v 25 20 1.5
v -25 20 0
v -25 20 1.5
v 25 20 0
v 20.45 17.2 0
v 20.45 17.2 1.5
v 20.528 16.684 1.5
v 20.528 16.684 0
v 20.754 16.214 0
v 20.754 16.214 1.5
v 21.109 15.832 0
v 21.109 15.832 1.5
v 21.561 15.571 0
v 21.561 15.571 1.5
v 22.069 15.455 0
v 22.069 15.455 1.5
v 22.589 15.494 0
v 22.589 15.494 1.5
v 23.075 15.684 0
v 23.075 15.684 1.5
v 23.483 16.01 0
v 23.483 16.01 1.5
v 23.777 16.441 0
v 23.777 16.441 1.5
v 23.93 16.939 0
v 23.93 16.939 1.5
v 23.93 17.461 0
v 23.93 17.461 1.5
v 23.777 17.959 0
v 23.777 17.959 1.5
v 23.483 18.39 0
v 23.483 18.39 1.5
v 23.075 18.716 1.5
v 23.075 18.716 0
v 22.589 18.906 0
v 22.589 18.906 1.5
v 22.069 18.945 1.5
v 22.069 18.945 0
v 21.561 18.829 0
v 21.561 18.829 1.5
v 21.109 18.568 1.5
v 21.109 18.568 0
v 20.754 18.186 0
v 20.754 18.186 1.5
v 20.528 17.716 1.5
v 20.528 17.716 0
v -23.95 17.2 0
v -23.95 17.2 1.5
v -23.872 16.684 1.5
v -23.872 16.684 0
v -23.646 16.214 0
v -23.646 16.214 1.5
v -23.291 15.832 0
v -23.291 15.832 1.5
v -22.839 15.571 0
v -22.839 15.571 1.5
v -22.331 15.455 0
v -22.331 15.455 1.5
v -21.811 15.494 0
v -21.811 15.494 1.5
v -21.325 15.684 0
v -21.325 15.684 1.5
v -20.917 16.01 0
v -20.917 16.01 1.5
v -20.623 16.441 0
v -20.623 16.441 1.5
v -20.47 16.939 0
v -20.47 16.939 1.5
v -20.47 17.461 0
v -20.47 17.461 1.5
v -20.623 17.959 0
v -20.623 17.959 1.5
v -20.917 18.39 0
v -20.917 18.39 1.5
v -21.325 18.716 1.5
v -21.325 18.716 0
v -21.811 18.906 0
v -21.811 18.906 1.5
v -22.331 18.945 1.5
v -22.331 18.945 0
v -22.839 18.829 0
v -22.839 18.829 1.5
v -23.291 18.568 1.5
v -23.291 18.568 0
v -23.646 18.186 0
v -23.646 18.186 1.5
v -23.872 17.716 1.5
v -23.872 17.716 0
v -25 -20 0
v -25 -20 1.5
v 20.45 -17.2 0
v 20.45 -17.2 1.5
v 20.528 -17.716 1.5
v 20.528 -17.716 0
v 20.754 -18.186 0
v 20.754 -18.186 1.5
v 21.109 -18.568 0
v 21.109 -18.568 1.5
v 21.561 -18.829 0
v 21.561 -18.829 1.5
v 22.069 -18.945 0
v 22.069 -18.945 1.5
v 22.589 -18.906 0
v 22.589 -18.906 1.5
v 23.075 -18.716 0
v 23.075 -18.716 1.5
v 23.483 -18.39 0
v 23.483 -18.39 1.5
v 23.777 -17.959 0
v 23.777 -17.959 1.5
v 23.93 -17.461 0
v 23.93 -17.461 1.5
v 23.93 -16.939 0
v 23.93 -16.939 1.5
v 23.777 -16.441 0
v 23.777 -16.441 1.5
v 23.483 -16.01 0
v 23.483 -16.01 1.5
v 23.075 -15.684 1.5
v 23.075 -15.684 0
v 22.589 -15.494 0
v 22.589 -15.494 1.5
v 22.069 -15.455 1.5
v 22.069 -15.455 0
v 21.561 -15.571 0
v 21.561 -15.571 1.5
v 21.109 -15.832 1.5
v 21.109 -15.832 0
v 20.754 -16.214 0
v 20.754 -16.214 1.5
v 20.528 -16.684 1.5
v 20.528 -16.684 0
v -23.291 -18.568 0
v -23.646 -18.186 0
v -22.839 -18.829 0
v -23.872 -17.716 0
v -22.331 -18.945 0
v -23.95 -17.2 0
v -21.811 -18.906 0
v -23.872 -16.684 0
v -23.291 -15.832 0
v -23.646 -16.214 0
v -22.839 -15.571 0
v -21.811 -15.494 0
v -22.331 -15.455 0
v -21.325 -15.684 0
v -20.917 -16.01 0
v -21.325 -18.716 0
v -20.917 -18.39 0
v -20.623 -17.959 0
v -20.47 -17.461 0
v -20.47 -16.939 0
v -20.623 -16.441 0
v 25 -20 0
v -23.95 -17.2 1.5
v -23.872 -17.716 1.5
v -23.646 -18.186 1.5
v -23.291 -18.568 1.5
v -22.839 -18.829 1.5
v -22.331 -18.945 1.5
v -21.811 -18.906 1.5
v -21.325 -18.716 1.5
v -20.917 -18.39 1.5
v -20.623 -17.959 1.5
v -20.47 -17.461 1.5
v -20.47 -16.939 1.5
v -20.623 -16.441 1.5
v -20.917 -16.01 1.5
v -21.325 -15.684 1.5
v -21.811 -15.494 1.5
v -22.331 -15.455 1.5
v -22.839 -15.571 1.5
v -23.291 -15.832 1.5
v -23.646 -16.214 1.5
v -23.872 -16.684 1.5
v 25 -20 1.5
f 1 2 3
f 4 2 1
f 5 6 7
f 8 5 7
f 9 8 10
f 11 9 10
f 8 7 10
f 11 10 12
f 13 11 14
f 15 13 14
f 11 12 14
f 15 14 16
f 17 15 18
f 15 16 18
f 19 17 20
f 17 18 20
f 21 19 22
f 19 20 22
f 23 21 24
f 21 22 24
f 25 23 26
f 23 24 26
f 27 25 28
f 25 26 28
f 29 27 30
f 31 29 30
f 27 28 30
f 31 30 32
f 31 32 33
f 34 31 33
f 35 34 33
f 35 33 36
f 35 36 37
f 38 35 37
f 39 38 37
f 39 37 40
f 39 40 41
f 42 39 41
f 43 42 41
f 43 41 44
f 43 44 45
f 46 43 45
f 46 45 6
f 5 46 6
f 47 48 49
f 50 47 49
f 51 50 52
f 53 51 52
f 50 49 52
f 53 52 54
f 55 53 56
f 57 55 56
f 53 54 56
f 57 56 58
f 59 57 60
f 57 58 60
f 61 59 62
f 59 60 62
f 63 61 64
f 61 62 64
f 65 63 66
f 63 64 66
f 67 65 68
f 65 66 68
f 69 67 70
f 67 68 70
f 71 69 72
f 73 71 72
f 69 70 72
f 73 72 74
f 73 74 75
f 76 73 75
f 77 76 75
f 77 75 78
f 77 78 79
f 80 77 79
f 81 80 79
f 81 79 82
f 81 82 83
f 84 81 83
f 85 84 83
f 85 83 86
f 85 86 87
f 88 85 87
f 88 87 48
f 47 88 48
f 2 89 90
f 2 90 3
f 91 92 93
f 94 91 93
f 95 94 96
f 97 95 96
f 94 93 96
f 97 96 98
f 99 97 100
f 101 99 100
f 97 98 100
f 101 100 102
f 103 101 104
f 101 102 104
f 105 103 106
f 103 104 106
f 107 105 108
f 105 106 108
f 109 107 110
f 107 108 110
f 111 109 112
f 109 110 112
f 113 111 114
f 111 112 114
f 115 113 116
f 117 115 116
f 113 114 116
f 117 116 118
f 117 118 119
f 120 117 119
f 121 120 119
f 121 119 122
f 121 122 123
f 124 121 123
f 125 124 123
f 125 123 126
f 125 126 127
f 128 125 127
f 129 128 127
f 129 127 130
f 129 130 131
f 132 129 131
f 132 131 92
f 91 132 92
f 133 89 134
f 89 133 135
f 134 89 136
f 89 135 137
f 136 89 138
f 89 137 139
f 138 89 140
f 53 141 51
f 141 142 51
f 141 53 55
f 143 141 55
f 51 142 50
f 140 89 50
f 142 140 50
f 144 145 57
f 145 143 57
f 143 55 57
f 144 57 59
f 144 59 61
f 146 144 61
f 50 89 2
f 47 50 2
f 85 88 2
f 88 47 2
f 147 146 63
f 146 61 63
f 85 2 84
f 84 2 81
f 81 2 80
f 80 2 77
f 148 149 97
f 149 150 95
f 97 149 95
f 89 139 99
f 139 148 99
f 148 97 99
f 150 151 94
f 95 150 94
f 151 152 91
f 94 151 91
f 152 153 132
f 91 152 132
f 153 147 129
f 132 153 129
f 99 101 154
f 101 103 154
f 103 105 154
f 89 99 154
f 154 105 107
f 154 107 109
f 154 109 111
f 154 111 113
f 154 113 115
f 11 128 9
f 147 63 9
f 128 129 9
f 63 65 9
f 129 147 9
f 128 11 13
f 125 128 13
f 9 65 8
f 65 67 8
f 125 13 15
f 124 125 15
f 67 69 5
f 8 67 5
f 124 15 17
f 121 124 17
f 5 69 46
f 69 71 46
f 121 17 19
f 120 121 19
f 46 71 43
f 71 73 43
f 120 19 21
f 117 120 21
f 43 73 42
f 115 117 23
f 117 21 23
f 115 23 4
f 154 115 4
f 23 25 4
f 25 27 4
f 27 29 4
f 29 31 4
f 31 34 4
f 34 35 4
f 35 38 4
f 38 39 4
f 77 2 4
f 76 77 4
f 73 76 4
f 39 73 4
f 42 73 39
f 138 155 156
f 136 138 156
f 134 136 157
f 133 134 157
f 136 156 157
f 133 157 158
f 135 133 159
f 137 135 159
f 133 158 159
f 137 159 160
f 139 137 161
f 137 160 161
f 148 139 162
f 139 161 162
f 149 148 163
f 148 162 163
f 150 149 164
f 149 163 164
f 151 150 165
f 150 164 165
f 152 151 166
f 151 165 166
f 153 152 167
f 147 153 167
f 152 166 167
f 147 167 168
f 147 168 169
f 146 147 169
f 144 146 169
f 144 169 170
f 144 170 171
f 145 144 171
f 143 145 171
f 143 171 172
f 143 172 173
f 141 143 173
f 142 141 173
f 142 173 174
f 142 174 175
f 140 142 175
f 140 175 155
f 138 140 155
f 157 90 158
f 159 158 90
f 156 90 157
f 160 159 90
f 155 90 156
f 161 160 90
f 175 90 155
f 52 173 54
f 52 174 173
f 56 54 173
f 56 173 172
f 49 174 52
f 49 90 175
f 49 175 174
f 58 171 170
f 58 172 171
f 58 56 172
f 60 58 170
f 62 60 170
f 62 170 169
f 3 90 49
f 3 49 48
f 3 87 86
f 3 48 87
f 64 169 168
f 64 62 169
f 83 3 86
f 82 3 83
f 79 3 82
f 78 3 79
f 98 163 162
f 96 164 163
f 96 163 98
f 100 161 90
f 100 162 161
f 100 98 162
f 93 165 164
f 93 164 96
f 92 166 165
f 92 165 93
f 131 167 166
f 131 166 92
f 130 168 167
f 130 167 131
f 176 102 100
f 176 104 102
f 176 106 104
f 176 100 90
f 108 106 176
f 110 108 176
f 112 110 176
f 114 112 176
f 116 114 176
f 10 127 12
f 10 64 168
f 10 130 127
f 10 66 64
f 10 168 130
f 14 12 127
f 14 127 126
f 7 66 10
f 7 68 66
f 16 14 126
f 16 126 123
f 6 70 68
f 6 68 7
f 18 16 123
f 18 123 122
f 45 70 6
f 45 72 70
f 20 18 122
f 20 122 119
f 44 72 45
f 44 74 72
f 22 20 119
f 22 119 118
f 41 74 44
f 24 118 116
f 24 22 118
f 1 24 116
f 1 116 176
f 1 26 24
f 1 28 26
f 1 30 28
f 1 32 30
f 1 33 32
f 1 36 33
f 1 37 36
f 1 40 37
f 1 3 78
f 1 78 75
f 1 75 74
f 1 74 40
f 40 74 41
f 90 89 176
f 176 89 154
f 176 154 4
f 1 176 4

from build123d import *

# Parameters (mm, degrees)
F2_W     = 50
F2_H     = 40
F3_DEPTH = 1.5
F4_D     = 3.5


with BuildPart() as f3:
    # F2 (on Top) → F3 (new body)
    with BuildSketch(Plane.XY):
        Rectangle(F2_W, F2_H)
    extrude(amount=F3_DEPTH)

    # F4 (through all)
    with Locations(Plane(origin=(0, 0, 0), x_dir=(1, 0, 0), z_dir=(0, 0, -1))):
        with Locations((-22.2, 17.2), (-22.2, -17.2), (22.2, 17.2), (22.2, -17.2)):
            Hole(F4_D / 2)


solid = f3.part
